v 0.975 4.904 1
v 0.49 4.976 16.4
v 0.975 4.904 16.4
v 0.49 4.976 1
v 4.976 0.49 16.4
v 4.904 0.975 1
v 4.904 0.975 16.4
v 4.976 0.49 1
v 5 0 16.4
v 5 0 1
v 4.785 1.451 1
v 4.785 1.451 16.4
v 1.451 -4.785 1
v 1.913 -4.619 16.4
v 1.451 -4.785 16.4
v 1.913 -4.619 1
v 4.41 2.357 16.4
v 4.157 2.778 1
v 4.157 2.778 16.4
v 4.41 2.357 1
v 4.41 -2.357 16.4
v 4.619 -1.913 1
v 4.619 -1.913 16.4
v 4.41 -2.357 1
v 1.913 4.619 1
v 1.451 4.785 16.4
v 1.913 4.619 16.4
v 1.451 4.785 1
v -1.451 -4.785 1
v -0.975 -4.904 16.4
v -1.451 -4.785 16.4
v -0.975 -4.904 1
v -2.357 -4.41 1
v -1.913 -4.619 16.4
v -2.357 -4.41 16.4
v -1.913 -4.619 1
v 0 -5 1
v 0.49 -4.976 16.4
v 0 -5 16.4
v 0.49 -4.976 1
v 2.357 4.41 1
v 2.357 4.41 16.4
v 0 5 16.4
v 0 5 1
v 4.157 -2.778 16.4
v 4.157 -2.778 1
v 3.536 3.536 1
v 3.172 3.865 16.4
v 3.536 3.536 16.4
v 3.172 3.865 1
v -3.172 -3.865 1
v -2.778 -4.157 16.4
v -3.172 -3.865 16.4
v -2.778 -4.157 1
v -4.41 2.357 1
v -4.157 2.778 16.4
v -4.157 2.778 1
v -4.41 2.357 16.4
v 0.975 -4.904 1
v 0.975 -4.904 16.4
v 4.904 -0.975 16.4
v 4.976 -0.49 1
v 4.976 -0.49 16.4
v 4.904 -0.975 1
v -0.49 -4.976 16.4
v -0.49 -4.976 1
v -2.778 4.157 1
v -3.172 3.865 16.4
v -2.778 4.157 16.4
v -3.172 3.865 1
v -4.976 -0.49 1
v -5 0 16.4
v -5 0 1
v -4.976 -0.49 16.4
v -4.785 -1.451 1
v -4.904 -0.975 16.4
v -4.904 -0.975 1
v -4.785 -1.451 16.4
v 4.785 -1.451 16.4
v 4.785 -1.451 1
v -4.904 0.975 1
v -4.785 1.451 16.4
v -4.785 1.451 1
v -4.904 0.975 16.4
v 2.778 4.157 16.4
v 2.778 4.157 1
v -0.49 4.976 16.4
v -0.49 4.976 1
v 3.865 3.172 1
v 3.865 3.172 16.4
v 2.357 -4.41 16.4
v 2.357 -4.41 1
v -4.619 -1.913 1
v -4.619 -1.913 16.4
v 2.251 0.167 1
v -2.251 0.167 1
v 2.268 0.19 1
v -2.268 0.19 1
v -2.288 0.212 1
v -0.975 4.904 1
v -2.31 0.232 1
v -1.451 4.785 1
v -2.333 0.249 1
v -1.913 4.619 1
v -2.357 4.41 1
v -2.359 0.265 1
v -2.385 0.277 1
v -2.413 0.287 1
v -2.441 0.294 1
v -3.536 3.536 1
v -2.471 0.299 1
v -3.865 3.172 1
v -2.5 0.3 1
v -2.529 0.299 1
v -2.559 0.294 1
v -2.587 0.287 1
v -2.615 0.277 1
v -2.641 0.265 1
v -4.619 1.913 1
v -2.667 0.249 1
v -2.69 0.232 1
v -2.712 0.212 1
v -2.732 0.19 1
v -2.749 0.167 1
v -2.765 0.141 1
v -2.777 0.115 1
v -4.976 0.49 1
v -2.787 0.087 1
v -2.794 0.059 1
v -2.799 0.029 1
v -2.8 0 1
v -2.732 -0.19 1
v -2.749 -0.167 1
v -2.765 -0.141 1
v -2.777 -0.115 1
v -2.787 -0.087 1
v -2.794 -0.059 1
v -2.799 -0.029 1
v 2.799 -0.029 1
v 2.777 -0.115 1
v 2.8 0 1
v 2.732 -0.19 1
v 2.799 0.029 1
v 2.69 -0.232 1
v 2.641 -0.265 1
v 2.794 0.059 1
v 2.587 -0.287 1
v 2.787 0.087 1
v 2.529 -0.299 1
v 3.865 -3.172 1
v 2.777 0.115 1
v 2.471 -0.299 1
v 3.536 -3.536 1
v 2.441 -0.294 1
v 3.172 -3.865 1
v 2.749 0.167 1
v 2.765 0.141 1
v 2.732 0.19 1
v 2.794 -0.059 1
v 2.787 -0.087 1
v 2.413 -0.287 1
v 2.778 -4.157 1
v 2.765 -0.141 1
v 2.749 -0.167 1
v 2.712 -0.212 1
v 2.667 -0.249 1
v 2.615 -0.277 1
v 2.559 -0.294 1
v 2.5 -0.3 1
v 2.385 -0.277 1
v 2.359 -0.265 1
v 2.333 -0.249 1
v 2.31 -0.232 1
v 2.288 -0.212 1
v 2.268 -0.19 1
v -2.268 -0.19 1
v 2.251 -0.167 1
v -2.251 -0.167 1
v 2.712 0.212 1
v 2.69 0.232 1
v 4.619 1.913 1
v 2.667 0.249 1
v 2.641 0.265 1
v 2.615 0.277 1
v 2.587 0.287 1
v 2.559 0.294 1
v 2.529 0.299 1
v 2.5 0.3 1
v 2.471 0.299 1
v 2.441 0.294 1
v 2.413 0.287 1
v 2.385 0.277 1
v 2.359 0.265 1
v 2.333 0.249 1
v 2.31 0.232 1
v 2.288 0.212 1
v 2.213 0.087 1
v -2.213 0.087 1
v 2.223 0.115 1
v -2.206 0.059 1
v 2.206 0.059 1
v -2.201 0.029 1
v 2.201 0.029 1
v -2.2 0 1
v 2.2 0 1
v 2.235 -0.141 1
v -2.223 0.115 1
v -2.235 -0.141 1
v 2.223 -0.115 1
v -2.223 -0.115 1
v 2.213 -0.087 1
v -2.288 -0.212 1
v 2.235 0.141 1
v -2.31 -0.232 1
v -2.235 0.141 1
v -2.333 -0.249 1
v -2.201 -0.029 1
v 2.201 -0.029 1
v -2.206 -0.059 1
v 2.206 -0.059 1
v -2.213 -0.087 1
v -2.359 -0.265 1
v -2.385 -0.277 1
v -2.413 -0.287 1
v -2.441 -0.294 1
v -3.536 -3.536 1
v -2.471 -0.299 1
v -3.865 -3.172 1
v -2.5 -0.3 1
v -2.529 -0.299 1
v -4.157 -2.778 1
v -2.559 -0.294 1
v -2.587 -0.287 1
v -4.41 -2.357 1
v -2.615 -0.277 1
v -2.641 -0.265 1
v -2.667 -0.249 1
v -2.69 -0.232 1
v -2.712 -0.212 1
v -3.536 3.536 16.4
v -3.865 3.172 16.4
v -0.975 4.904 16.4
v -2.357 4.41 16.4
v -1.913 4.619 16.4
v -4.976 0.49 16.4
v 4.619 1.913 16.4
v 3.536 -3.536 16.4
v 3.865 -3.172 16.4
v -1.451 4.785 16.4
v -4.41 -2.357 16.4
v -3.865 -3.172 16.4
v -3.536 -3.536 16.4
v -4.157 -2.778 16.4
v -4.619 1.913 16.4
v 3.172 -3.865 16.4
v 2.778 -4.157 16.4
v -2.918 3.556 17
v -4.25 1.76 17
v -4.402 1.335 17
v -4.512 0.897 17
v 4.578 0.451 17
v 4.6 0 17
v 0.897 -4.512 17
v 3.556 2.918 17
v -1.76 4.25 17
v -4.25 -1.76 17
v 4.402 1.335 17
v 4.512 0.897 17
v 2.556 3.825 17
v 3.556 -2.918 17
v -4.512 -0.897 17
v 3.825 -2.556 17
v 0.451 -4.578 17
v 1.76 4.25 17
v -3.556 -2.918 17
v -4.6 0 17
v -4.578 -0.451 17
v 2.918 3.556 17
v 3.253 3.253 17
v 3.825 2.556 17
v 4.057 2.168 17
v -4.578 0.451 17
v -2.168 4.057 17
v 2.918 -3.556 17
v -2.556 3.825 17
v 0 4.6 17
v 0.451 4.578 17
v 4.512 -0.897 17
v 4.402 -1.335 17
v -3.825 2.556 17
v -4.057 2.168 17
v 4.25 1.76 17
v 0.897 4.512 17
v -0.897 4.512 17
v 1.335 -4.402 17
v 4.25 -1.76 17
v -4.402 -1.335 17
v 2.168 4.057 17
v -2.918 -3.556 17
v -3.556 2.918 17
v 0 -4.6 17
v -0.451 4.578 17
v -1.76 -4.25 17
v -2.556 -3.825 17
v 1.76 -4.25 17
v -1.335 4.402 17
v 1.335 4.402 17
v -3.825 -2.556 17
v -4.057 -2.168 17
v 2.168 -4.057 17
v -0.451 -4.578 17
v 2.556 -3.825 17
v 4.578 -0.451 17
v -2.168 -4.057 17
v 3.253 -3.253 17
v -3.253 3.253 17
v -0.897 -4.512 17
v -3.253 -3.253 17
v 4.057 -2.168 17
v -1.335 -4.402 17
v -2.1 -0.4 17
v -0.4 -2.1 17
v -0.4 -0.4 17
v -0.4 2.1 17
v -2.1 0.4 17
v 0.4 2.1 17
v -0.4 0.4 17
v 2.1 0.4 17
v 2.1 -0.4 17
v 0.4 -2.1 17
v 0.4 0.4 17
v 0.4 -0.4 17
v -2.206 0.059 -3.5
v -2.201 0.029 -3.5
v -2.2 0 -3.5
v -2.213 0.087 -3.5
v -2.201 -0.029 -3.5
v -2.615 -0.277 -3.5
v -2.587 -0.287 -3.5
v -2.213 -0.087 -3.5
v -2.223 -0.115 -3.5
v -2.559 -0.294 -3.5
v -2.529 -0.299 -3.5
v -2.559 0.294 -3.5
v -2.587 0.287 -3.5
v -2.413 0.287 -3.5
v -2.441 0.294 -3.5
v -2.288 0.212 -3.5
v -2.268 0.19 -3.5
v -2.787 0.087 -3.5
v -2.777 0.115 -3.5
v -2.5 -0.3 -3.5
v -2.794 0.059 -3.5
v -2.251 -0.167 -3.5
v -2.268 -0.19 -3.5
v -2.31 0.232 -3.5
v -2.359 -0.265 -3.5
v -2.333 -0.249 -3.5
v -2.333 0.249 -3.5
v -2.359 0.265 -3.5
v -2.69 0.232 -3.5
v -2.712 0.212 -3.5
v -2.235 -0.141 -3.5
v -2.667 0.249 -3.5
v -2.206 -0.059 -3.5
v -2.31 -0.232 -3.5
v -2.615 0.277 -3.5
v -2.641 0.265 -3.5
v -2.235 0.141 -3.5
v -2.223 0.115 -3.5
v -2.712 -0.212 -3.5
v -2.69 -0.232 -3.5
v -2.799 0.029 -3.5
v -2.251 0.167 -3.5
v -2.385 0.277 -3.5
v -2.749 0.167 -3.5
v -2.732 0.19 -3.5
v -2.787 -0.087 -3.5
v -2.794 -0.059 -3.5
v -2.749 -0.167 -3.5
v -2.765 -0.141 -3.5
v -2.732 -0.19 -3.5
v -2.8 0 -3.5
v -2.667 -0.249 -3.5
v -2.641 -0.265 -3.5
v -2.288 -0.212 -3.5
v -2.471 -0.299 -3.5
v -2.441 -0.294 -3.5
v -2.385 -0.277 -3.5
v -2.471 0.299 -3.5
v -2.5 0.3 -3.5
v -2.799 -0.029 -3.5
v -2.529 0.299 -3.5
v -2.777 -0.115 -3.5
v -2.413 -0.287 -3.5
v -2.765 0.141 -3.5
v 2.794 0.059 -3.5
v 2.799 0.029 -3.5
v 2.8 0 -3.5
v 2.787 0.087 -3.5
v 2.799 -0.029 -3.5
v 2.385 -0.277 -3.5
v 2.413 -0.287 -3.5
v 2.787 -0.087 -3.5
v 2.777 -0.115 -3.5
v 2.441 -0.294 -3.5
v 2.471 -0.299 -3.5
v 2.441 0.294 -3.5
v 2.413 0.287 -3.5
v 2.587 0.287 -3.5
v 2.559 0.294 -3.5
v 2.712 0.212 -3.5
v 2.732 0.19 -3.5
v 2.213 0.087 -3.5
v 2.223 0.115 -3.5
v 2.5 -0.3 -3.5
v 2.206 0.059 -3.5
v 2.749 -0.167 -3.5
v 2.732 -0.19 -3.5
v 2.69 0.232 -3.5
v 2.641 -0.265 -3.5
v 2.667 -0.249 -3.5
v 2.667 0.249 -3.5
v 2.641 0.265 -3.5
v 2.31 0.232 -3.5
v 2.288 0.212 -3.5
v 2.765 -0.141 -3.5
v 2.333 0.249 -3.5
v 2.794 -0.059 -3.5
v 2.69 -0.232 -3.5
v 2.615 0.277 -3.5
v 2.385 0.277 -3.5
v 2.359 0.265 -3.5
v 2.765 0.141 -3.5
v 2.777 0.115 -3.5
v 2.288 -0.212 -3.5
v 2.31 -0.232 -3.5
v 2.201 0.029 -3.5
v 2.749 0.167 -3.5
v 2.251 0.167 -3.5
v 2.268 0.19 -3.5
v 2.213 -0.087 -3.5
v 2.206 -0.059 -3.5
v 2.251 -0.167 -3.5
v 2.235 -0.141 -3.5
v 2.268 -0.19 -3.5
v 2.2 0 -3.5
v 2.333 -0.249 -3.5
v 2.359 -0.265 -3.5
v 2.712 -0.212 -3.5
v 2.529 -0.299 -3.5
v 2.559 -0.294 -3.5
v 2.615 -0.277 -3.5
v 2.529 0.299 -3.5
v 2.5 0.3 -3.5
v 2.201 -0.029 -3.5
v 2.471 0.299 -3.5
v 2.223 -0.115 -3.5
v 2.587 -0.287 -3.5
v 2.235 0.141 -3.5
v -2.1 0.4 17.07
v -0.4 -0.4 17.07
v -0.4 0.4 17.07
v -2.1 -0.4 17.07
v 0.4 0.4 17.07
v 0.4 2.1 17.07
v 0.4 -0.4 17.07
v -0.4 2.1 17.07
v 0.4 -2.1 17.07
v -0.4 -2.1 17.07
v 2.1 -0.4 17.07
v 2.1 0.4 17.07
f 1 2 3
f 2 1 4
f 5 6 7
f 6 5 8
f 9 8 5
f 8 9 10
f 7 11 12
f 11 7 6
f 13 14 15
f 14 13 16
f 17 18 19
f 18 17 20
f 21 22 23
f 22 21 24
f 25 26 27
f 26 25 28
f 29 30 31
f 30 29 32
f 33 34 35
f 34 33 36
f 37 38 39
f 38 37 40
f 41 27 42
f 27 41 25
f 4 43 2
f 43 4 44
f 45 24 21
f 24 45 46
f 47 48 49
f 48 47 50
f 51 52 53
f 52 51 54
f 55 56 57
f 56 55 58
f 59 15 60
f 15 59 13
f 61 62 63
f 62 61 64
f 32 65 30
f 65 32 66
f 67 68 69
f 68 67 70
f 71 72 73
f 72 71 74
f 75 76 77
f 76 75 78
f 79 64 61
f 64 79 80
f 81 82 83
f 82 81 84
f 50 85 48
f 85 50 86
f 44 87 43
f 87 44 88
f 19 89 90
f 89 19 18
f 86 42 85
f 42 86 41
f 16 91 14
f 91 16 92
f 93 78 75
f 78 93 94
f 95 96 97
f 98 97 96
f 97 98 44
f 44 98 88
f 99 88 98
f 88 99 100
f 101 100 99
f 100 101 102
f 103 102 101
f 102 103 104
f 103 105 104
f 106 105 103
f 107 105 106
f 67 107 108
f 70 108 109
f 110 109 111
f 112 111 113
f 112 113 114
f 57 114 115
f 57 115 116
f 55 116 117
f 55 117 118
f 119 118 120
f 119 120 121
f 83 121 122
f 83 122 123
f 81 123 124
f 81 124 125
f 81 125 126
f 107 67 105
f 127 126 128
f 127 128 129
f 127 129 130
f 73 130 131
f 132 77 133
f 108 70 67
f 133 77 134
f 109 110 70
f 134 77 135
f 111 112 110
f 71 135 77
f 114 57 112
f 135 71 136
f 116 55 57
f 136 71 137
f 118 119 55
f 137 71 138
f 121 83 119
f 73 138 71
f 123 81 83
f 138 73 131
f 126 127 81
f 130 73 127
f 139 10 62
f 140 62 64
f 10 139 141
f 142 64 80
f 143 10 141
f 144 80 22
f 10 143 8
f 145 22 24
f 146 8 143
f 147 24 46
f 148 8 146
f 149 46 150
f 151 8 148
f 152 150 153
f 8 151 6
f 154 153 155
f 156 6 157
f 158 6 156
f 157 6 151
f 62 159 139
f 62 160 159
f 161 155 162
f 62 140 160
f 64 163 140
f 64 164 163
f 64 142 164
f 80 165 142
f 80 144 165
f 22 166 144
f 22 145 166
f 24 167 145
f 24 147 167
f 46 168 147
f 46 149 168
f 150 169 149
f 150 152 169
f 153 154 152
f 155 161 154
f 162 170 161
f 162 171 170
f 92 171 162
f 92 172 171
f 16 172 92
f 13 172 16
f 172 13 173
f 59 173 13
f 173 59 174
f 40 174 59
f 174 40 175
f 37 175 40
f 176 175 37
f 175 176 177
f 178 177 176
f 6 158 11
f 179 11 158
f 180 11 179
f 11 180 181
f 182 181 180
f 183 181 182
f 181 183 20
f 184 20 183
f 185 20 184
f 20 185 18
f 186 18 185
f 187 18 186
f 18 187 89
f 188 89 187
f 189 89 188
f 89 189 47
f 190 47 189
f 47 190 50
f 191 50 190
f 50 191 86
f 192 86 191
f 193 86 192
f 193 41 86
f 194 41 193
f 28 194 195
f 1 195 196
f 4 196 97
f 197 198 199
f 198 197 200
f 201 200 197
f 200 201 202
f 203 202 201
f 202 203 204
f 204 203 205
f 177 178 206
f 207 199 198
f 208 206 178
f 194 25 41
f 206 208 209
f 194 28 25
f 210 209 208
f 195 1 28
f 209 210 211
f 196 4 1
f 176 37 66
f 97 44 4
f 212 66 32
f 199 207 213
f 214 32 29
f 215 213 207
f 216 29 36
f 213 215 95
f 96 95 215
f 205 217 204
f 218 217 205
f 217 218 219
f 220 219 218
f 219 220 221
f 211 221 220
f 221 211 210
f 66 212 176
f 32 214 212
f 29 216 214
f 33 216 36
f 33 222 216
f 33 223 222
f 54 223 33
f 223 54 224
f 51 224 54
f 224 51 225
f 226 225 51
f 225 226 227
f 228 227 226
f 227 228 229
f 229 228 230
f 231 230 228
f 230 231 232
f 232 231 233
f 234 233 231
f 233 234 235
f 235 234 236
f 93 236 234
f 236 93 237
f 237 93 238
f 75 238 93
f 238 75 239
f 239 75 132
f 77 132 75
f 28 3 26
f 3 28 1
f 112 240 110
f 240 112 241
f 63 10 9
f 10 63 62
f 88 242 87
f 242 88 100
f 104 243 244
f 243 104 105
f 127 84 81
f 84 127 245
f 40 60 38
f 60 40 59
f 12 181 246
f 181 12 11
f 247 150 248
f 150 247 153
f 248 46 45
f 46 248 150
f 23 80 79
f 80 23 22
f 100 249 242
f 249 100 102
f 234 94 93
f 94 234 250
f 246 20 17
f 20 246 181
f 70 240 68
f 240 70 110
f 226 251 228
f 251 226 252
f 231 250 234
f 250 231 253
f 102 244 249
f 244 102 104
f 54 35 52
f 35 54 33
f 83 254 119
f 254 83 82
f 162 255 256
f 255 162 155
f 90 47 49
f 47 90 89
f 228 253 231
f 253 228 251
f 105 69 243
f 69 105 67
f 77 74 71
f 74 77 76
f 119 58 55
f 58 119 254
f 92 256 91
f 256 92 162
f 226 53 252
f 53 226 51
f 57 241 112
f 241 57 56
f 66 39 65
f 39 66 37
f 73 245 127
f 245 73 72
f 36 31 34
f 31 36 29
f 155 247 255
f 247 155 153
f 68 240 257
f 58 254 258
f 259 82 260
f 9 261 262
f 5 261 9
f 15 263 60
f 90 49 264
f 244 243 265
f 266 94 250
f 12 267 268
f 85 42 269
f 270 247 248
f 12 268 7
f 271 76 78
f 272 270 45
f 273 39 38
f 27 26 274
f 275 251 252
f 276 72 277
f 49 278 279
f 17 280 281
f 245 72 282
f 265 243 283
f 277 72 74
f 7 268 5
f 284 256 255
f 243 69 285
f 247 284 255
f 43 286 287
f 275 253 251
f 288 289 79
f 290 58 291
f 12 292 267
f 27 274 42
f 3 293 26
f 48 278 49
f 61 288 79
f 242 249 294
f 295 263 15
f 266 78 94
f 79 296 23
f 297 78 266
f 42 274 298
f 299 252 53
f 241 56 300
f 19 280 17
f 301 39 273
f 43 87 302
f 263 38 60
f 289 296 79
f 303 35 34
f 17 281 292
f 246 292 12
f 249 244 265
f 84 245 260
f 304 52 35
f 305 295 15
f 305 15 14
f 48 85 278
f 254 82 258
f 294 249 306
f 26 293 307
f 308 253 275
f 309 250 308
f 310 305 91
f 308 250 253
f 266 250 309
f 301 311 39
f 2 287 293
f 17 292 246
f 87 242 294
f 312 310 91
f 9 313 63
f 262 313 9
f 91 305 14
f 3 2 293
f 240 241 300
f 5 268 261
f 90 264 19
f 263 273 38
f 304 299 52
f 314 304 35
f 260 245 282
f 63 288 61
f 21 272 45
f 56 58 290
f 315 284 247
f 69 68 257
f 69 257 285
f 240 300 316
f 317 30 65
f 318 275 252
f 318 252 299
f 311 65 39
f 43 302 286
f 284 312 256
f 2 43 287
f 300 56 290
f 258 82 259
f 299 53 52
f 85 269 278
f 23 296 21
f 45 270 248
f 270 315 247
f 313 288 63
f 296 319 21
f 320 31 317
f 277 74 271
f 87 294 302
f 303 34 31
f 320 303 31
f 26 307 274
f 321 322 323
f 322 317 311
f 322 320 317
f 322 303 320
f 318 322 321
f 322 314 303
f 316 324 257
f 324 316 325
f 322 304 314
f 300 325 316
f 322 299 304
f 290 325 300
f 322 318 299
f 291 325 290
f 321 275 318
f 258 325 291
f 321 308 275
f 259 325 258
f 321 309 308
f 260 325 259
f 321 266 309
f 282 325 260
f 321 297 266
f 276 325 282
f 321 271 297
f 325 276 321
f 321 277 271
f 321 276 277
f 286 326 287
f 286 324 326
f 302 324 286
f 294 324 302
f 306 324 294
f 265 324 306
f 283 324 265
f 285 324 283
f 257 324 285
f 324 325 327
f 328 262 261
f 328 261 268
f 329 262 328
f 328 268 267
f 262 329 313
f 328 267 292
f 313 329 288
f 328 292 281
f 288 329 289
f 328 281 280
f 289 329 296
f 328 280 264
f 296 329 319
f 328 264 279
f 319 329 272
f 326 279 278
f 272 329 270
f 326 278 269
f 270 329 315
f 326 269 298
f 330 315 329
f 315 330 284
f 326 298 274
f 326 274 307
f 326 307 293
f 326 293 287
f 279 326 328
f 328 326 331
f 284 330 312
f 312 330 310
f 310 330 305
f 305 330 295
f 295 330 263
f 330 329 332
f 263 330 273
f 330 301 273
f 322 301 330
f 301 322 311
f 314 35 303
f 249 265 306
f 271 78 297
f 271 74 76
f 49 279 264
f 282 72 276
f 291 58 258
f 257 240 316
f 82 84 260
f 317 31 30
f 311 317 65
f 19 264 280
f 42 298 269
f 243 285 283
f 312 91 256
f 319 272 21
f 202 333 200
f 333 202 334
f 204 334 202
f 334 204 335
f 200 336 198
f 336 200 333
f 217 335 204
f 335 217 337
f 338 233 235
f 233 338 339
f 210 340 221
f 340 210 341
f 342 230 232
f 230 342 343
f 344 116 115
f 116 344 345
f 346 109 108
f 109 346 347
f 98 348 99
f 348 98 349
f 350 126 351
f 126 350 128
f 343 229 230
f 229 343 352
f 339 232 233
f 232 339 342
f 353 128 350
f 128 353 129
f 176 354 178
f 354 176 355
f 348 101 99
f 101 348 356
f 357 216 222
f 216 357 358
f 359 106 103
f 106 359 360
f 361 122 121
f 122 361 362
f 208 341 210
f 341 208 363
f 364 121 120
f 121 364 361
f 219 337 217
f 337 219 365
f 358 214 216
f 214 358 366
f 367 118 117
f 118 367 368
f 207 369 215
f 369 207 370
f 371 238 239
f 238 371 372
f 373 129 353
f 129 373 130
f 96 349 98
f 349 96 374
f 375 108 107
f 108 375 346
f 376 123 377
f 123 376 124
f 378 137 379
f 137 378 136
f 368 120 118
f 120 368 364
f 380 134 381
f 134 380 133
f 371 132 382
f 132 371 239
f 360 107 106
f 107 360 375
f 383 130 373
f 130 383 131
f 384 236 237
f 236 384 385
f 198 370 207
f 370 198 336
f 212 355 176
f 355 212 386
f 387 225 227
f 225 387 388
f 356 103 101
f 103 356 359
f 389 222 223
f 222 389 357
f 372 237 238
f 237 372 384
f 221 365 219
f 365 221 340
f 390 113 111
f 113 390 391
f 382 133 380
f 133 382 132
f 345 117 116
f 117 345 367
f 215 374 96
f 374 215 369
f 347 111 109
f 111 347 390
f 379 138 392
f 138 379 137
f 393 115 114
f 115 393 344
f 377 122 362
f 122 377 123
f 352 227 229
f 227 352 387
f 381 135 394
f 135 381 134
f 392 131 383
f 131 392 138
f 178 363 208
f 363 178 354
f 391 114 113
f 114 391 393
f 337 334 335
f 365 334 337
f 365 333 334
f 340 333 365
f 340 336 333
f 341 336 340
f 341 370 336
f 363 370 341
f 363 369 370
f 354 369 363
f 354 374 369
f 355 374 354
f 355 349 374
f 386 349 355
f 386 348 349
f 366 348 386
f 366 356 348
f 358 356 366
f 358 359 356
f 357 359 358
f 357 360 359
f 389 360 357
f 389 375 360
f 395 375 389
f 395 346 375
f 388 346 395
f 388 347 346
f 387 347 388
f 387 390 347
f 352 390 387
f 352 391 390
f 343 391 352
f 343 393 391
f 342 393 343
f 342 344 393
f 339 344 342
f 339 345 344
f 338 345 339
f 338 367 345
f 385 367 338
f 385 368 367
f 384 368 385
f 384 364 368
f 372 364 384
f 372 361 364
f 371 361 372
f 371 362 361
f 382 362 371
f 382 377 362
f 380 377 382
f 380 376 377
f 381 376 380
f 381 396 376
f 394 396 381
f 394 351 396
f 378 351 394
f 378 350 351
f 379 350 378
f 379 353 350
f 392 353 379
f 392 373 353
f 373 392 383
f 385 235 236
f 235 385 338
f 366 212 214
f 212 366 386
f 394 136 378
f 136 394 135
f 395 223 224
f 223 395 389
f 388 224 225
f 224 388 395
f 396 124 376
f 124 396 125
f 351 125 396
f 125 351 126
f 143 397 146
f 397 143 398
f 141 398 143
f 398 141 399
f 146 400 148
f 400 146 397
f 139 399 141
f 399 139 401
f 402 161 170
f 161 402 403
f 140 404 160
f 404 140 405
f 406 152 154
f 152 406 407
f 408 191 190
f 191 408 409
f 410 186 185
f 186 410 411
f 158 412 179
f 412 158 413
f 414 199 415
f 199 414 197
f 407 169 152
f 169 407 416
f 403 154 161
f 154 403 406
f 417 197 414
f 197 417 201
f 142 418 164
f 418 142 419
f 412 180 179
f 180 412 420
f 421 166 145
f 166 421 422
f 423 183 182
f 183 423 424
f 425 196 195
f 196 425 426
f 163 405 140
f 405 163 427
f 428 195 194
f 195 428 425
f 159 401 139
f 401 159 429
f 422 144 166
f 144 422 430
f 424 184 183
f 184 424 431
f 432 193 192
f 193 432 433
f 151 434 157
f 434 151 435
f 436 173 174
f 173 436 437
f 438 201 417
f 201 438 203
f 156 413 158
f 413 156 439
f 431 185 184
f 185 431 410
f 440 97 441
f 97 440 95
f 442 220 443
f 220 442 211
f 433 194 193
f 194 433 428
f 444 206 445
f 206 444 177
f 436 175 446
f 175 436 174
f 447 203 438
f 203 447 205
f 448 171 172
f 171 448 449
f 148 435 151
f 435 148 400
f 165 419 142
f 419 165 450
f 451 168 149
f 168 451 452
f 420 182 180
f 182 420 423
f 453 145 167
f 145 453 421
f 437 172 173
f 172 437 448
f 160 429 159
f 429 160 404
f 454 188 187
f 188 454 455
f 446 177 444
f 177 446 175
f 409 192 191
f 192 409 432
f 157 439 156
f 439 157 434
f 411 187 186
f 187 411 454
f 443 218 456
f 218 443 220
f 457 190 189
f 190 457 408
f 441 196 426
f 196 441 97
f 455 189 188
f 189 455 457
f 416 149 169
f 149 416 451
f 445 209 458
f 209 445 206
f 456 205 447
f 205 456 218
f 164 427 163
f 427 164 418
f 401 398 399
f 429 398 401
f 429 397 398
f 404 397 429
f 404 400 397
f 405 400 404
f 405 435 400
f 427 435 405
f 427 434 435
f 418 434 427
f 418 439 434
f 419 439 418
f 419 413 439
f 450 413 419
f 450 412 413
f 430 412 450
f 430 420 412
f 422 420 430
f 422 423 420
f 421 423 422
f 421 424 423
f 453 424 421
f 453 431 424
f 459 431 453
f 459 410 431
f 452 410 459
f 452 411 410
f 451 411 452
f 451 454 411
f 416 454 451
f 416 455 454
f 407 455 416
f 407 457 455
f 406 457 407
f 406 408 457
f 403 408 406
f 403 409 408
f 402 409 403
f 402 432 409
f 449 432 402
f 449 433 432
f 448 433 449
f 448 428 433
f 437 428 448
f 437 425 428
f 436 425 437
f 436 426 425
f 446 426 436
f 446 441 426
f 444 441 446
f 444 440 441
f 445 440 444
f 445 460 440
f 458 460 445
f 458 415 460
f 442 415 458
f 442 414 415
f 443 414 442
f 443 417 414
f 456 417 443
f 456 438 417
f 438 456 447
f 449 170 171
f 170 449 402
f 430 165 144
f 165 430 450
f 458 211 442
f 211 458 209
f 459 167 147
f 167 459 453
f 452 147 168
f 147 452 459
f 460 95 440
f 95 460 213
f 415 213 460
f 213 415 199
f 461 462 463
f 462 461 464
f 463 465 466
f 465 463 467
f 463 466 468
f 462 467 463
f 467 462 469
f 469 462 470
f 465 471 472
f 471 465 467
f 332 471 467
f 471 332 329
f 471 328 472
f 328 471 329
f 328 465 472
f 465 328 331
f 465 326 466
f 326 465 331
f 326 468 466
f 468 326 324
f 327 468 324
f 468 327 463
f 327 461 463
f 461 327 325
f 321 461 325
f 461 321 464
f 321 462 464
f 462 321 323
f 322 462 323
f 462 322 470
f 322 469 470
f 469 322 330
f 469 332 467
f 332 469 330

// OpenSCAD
$fn = 64;

body_diameter = 10;
body_height = 16;
lead_spacing = 5;
lead_diameter = 0.6;
lead_length_below = 3.5;
body_lift = 1;
lead_stub = 1;
top_chamfer = 0.6;

module lead(x) {
    color([0.75, 0.75, 0.75])
    translate([x, 0, -lead_length_below])
        cylinder(h = lead_length_below + body_lift + lead_stub, d = lead_diameter);
}

module capacitor_body() {
    color([0.16, 0.18, 0.19])
    union() {
        translate([0, 0, body_lift])
            cylinder(h = body_height - top_chamfer, d = body_diameter);
        translate([0, 0, body_lift + body_height - top_chamfer])
            cylinder(h = top_chamfer, d1 = body_diameter, d2 = body_diameter * 0.92);
    }
}

module top_vent() {
    color([0.78, 0.78, 0.78])
    translate([0, 0, body_lift + body_height - 0.05])
    linear_extrude(height = 0.12)
    union() {
        square([body_diameter * 0.42, body_diameter * 0.08], center = true);
        square([body_diameter * 0.08, body_diameter * 0.42], center = true);
    }
}

lead(-lead_spacing / 2);
lead( lead_spacing / 2);
capacitor_body();
top_vent();
